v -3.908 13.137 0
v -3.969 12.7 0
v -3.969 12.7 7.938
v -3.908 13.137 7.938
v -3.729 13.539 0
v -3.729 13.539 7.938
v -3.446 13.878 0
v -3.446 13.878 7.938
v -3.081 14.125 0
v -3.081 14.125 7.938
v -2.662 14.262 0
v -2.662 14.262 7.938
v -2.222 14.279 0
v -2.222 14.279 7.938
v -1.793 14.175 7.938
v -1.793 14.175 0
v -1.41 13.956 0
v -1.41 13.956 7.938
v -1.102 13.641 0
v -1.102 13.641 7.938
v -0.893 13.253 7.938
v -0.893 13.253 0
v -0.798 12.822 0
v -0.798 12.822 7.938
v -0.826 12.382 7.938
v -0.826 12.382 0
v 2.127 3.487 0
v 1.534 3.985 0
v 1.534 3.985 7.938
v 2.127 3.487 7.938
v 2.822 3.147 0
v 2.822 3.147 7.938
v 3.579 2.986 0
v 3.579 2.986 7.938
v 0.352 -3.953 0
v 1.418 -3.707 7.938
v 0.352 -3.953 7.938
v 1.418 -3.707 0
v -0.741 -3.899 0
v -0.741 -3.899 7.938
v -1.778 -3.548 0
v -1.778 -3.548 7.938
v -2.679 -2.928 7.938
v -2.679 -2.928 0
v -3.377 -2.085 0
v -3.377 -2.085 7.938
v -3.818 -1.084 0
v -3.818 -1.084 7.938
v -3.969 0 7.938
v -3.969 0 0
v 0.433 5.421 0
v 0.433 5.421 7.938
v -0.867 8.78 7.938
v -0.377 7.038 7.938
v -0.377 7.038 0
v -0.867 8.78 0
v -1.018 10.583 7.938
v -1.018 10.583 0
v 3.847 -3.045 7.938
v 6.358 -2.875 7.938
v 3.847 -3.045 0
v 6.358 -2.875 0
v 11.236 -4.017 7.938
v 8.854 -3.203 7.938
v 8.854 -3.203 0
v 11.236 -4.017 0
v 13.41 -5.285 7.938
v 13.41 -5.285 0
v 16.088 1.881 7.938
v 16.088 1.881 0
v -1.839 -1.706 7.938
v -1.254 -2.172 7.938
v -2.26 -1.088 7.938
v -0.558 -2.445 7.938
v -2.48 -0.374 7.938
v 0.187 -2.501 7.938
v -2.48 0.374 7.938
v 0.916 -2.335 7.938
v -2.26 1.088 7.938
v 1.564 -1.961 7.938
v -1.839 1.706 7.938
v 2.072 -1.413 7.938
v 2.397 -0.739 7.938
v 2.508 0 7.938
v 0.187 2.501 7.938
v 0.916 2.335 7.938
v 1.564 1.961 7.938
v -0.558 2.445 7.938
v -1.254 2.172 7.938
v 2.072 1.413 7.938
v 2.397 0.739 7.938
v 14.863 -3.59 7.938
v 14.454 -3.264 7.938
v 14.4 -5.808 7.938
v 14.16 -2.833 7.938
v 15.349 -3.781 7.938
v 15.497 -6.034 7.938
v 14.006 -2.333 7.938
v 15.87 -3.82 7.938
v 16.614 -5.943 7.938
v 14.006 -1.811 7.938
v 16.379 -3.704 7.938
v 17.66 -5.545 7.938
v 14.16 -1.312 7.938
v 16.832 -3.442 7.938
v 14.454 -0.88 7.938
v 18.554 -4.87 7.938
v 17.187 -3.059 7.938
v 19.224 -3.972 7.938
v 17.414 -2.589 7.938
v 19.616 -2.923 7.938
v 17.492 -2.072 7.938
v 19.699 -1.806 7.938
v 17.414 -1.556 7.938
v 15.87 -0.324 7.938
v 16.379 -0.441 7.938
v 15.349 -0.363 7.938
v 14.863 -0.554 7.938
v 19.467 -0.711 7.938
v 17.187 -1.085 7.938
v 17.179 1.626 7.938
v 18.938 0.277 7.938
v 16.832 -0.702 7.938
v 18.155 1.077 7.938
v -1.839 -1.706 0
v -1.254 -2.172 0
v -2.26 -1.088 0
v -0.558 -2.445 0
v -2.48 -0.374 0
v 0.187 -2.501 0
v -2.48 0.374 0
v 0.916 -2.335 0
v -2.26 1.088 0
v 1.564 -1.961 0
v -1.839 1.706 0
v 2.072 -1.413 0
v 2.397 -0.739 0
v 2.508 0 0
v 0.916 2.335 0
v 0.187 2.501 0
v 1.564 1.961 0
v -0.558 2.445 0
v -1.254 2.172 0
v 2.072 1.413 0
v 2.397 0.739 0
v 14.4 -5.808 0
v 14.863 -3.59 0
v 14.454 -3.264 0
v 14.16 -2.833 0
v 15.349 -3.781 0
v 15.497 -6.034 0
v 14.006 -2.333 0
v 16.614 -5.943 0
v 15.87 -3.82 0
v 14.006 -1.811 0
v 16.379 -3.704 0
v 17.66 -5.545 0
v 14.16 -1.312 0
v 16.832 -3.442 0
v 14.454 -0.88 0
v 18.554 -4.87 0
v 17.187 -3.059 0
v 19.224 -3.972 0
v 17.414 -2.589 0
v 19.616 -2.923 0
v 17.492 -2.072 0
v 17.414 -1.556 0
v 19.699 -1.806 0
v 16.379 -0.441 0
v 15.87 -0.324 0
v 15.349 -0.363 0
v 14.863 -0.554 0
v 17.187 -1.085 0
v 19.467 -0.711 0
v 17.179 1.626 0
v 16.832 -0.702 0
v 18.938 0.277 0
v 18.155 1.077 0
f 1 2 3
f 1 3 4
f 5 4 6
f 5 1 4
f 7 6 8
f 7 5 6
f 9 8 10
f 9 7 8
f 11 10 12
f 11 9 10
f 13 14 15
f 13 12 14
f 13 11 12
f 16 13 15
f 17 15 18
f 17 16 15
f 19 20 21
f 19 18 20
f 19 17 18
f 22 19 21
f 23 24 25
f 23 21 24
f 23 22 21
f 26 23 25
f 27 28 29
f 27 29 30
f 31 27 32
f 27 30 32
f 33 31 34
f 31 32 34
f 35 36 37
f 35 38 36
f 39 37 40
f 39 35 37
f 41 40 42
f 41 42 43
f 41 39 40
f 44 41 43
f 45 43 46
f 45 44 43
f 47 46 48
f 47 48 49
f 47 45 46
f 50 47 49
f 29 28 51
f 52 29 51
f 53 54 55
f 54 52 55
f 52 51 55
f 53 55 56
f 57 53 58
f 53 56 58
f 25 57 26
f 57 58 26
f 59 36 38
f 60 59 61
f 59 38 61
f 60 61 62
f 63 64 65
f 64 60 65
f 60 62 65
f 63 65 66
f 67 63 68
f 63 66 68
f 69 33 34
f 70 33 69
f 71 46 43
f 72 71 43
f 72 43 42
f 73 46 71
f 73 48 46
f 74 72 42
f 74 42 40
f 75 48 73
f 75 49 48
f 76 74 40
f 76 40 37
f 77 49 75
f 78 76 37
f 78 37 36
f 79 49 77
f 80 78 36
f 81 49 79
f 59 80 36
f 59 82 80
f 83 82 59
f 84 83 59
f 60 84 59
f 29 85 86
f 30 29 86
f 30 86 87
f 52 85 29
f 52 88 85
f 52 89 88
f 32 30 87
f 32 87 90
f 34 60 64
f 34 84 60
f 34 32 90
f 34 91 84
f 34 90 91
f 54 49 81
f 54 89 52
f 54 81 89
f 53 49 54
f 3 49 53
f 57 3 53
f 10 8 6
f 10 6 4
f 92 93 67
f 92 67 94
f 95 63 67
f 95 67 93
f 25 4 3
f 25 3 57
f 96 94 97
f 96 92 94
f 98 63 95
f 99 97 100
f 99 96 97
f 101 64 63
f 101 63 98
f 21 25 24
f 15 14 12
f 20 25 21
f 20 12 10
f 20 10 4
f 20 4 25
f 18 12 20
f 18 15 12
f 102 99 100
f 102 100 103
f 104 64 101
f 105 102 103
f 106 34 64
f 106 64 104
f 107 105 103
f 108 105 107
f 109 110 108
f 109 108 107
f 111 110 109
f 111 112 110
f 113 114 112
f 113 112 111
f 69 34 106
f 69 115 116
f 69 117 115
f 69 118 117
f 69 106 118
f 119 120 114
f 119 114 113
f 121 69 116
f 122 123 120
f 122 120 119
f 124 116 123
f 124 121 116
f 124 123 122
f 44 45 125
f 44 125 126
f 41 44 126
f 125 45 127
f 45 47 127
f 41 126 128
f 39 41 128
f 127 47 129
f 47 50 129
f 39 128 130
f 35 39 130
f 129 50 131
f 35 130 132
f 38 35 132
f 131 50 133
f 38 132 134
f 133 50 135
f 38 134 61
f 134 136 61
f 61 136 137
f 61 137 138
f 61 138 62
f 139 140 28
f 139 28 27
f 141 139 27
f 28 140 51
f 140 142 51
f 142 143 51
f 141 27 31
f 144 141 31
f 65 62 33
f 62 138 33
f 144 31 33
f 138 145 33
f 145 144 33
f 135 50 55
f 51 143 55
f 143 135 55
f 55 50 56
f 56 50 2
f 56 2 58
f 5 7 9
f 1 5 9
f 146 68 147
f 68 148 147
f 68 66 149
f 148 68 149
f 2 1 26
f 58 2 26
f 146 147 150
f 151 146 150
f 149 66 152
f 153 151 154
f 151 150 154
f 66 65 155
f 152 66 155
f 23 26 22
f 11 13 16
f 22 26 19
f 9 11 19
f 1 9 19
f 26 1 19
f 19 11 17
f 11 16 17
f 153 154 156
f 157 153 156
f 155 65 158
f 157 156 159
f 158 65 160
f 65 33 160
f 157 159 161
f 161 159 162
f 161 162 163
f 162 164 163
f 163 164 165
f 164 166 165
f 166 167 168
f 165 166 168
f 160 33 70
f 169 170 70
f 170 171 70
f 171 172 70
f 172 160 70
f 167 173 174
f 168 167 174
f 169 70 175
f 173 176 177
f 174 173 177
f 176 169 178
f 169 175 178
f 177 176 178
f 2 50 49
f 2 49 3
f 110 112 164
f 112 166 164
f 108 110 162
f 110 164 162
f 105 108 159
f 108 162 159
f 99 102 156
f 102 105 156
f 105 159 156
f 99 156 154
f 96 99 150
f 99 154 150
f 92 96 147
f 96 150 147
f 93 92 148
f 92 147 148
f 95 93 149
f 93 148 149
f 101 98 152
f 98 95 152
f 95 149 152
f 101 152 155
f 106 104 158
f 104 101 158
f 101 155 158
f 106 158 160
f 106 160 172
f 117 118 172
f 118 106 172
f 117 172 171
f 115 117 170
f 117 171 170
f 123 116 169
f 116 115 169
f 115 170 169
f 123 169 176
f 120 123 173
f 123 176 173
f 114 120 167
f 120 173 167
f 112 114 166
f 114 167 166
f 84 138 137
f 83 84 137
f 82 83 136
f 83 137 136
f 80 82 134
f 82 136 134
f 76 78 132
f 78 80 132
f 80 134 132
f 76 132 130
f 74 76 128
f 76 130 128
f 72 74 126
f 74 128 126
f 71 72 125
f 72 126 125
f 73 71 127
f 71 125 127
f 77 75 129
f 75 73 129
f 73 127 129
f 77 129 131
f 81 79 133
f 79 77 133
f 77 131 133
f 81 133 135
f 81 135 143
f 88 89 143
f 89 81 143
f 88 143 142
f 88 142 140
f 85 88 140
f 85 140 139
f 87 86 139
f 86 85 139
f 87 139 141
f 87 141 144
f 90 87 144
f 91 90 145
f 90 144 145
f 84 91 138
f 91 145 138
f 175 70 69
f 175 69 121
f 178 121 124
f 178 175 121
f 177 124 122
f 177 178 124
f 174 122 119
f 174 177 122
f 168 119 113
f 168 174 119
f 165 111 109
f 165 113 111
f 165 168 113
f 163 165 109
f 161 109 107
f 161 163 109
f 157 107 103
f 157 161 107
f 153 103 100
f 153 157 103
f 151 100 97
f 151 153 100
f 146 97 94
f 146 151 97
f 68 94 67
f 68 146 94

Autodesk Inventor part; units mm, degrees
ref_plane "YZ Plane" through (0, 0, 0) normal (1, 0, 0) x (0, 1, 0)
ref_plane "XZ Plane" through (0, 0, 0) normal (0, 1, 0) x (-1, 0, 0)
ref_plane "XY Plane" through (0, 0, 0) normal (0, 0, 1) x (1, 0, 0)
sketch "Sketch4" plane through (0, 0, 0) normal (0, 0, 1) x (1, 0, 0)
  circle A0 centre (0, 0) radius 2.5083
  circle A1 centre (0, 0) radius 3.9688
  line L0 (-3.9688, 0) -> (-3.9688, 12.7)
  arc A2 (-0.8259, 12.3821) -> (-3.9688, 12.7) centre (-2.3812, 12.7) ccw
  arc A3 (-0.8259, 12.3821) -> (2.5018, 3.0809) centre (8.5062, 10.475) ccw
  circle A4 centre (0, 0) radius 4.7625 construction
  circle A5 centre (15.7392, -2.0721) radius 6.35 construction
  circle A6 centre (15.7392, -2.0721) radius 3.9688
  circle A7 centre (15.7392, -2.0721) radius 1.7526
  line L1 (2.5018, 3.0809) -> (16.0883, 1.8813)
  circle A8 centre (6.35, -12.7) radius 3.9688
  circle A9 centre (6.35, -12.7) radius 1.7526
  line L2 (2.8002, -14.4749) -> (-3.5498, -1.7749)
  circle A10 centre (5.9564, -15.5682) radius 12.7
  line L3 (18.7135, -4.6997) -> (9.3243, -15.3276)
  line L4 (0, 0) -> (0, 4.7625) construction
  line L5 (0, 0) -> (15.7392, -2.0721) construction
  line L6 (15.7392, -2.0721) -> (16.2572, 1.8627) construction
  point P0 (3.9688, 0)
  point P1 (12.5559, -4.4423)
  point P2 (2.0561, -3.3946)
  point P3 (1.4182, -3.7067)
  point P4 (13.41, -5.2855)
  dimension "d54" = 9.525
  dimension "d44" = 5.0165
  dimension "d45" = 7.9375
  dimension "d51" = 12.7
  dimension "d52" = 3.175
  dimension "d53" = 9.525
  dimension "d56" = 12.7
  dimension "d57" = 7.9375
  dimension "d58" = 3.5052
  dimension "d61" = 7.9375
  dimension "d62" = 3.5052
  dimension "d63" = 12.7
  dimension "d64" = 6.35
  dimension "d67" = 97.5
  dimension "d68" = 15.875
  dimension "d69" = 25.4
extrude "Extrusion3" add sketch "Sketch4" along normal blind 7.9375 contours A1 | A1 L1 A6 A10 | A1 L0 A2 A3 | A6
fillet "Fillet5" radius 3.175 1 edges at (2.5018, 3.0809, 3.9688)
properties part number "Lever" material "Aluminum 6061"
